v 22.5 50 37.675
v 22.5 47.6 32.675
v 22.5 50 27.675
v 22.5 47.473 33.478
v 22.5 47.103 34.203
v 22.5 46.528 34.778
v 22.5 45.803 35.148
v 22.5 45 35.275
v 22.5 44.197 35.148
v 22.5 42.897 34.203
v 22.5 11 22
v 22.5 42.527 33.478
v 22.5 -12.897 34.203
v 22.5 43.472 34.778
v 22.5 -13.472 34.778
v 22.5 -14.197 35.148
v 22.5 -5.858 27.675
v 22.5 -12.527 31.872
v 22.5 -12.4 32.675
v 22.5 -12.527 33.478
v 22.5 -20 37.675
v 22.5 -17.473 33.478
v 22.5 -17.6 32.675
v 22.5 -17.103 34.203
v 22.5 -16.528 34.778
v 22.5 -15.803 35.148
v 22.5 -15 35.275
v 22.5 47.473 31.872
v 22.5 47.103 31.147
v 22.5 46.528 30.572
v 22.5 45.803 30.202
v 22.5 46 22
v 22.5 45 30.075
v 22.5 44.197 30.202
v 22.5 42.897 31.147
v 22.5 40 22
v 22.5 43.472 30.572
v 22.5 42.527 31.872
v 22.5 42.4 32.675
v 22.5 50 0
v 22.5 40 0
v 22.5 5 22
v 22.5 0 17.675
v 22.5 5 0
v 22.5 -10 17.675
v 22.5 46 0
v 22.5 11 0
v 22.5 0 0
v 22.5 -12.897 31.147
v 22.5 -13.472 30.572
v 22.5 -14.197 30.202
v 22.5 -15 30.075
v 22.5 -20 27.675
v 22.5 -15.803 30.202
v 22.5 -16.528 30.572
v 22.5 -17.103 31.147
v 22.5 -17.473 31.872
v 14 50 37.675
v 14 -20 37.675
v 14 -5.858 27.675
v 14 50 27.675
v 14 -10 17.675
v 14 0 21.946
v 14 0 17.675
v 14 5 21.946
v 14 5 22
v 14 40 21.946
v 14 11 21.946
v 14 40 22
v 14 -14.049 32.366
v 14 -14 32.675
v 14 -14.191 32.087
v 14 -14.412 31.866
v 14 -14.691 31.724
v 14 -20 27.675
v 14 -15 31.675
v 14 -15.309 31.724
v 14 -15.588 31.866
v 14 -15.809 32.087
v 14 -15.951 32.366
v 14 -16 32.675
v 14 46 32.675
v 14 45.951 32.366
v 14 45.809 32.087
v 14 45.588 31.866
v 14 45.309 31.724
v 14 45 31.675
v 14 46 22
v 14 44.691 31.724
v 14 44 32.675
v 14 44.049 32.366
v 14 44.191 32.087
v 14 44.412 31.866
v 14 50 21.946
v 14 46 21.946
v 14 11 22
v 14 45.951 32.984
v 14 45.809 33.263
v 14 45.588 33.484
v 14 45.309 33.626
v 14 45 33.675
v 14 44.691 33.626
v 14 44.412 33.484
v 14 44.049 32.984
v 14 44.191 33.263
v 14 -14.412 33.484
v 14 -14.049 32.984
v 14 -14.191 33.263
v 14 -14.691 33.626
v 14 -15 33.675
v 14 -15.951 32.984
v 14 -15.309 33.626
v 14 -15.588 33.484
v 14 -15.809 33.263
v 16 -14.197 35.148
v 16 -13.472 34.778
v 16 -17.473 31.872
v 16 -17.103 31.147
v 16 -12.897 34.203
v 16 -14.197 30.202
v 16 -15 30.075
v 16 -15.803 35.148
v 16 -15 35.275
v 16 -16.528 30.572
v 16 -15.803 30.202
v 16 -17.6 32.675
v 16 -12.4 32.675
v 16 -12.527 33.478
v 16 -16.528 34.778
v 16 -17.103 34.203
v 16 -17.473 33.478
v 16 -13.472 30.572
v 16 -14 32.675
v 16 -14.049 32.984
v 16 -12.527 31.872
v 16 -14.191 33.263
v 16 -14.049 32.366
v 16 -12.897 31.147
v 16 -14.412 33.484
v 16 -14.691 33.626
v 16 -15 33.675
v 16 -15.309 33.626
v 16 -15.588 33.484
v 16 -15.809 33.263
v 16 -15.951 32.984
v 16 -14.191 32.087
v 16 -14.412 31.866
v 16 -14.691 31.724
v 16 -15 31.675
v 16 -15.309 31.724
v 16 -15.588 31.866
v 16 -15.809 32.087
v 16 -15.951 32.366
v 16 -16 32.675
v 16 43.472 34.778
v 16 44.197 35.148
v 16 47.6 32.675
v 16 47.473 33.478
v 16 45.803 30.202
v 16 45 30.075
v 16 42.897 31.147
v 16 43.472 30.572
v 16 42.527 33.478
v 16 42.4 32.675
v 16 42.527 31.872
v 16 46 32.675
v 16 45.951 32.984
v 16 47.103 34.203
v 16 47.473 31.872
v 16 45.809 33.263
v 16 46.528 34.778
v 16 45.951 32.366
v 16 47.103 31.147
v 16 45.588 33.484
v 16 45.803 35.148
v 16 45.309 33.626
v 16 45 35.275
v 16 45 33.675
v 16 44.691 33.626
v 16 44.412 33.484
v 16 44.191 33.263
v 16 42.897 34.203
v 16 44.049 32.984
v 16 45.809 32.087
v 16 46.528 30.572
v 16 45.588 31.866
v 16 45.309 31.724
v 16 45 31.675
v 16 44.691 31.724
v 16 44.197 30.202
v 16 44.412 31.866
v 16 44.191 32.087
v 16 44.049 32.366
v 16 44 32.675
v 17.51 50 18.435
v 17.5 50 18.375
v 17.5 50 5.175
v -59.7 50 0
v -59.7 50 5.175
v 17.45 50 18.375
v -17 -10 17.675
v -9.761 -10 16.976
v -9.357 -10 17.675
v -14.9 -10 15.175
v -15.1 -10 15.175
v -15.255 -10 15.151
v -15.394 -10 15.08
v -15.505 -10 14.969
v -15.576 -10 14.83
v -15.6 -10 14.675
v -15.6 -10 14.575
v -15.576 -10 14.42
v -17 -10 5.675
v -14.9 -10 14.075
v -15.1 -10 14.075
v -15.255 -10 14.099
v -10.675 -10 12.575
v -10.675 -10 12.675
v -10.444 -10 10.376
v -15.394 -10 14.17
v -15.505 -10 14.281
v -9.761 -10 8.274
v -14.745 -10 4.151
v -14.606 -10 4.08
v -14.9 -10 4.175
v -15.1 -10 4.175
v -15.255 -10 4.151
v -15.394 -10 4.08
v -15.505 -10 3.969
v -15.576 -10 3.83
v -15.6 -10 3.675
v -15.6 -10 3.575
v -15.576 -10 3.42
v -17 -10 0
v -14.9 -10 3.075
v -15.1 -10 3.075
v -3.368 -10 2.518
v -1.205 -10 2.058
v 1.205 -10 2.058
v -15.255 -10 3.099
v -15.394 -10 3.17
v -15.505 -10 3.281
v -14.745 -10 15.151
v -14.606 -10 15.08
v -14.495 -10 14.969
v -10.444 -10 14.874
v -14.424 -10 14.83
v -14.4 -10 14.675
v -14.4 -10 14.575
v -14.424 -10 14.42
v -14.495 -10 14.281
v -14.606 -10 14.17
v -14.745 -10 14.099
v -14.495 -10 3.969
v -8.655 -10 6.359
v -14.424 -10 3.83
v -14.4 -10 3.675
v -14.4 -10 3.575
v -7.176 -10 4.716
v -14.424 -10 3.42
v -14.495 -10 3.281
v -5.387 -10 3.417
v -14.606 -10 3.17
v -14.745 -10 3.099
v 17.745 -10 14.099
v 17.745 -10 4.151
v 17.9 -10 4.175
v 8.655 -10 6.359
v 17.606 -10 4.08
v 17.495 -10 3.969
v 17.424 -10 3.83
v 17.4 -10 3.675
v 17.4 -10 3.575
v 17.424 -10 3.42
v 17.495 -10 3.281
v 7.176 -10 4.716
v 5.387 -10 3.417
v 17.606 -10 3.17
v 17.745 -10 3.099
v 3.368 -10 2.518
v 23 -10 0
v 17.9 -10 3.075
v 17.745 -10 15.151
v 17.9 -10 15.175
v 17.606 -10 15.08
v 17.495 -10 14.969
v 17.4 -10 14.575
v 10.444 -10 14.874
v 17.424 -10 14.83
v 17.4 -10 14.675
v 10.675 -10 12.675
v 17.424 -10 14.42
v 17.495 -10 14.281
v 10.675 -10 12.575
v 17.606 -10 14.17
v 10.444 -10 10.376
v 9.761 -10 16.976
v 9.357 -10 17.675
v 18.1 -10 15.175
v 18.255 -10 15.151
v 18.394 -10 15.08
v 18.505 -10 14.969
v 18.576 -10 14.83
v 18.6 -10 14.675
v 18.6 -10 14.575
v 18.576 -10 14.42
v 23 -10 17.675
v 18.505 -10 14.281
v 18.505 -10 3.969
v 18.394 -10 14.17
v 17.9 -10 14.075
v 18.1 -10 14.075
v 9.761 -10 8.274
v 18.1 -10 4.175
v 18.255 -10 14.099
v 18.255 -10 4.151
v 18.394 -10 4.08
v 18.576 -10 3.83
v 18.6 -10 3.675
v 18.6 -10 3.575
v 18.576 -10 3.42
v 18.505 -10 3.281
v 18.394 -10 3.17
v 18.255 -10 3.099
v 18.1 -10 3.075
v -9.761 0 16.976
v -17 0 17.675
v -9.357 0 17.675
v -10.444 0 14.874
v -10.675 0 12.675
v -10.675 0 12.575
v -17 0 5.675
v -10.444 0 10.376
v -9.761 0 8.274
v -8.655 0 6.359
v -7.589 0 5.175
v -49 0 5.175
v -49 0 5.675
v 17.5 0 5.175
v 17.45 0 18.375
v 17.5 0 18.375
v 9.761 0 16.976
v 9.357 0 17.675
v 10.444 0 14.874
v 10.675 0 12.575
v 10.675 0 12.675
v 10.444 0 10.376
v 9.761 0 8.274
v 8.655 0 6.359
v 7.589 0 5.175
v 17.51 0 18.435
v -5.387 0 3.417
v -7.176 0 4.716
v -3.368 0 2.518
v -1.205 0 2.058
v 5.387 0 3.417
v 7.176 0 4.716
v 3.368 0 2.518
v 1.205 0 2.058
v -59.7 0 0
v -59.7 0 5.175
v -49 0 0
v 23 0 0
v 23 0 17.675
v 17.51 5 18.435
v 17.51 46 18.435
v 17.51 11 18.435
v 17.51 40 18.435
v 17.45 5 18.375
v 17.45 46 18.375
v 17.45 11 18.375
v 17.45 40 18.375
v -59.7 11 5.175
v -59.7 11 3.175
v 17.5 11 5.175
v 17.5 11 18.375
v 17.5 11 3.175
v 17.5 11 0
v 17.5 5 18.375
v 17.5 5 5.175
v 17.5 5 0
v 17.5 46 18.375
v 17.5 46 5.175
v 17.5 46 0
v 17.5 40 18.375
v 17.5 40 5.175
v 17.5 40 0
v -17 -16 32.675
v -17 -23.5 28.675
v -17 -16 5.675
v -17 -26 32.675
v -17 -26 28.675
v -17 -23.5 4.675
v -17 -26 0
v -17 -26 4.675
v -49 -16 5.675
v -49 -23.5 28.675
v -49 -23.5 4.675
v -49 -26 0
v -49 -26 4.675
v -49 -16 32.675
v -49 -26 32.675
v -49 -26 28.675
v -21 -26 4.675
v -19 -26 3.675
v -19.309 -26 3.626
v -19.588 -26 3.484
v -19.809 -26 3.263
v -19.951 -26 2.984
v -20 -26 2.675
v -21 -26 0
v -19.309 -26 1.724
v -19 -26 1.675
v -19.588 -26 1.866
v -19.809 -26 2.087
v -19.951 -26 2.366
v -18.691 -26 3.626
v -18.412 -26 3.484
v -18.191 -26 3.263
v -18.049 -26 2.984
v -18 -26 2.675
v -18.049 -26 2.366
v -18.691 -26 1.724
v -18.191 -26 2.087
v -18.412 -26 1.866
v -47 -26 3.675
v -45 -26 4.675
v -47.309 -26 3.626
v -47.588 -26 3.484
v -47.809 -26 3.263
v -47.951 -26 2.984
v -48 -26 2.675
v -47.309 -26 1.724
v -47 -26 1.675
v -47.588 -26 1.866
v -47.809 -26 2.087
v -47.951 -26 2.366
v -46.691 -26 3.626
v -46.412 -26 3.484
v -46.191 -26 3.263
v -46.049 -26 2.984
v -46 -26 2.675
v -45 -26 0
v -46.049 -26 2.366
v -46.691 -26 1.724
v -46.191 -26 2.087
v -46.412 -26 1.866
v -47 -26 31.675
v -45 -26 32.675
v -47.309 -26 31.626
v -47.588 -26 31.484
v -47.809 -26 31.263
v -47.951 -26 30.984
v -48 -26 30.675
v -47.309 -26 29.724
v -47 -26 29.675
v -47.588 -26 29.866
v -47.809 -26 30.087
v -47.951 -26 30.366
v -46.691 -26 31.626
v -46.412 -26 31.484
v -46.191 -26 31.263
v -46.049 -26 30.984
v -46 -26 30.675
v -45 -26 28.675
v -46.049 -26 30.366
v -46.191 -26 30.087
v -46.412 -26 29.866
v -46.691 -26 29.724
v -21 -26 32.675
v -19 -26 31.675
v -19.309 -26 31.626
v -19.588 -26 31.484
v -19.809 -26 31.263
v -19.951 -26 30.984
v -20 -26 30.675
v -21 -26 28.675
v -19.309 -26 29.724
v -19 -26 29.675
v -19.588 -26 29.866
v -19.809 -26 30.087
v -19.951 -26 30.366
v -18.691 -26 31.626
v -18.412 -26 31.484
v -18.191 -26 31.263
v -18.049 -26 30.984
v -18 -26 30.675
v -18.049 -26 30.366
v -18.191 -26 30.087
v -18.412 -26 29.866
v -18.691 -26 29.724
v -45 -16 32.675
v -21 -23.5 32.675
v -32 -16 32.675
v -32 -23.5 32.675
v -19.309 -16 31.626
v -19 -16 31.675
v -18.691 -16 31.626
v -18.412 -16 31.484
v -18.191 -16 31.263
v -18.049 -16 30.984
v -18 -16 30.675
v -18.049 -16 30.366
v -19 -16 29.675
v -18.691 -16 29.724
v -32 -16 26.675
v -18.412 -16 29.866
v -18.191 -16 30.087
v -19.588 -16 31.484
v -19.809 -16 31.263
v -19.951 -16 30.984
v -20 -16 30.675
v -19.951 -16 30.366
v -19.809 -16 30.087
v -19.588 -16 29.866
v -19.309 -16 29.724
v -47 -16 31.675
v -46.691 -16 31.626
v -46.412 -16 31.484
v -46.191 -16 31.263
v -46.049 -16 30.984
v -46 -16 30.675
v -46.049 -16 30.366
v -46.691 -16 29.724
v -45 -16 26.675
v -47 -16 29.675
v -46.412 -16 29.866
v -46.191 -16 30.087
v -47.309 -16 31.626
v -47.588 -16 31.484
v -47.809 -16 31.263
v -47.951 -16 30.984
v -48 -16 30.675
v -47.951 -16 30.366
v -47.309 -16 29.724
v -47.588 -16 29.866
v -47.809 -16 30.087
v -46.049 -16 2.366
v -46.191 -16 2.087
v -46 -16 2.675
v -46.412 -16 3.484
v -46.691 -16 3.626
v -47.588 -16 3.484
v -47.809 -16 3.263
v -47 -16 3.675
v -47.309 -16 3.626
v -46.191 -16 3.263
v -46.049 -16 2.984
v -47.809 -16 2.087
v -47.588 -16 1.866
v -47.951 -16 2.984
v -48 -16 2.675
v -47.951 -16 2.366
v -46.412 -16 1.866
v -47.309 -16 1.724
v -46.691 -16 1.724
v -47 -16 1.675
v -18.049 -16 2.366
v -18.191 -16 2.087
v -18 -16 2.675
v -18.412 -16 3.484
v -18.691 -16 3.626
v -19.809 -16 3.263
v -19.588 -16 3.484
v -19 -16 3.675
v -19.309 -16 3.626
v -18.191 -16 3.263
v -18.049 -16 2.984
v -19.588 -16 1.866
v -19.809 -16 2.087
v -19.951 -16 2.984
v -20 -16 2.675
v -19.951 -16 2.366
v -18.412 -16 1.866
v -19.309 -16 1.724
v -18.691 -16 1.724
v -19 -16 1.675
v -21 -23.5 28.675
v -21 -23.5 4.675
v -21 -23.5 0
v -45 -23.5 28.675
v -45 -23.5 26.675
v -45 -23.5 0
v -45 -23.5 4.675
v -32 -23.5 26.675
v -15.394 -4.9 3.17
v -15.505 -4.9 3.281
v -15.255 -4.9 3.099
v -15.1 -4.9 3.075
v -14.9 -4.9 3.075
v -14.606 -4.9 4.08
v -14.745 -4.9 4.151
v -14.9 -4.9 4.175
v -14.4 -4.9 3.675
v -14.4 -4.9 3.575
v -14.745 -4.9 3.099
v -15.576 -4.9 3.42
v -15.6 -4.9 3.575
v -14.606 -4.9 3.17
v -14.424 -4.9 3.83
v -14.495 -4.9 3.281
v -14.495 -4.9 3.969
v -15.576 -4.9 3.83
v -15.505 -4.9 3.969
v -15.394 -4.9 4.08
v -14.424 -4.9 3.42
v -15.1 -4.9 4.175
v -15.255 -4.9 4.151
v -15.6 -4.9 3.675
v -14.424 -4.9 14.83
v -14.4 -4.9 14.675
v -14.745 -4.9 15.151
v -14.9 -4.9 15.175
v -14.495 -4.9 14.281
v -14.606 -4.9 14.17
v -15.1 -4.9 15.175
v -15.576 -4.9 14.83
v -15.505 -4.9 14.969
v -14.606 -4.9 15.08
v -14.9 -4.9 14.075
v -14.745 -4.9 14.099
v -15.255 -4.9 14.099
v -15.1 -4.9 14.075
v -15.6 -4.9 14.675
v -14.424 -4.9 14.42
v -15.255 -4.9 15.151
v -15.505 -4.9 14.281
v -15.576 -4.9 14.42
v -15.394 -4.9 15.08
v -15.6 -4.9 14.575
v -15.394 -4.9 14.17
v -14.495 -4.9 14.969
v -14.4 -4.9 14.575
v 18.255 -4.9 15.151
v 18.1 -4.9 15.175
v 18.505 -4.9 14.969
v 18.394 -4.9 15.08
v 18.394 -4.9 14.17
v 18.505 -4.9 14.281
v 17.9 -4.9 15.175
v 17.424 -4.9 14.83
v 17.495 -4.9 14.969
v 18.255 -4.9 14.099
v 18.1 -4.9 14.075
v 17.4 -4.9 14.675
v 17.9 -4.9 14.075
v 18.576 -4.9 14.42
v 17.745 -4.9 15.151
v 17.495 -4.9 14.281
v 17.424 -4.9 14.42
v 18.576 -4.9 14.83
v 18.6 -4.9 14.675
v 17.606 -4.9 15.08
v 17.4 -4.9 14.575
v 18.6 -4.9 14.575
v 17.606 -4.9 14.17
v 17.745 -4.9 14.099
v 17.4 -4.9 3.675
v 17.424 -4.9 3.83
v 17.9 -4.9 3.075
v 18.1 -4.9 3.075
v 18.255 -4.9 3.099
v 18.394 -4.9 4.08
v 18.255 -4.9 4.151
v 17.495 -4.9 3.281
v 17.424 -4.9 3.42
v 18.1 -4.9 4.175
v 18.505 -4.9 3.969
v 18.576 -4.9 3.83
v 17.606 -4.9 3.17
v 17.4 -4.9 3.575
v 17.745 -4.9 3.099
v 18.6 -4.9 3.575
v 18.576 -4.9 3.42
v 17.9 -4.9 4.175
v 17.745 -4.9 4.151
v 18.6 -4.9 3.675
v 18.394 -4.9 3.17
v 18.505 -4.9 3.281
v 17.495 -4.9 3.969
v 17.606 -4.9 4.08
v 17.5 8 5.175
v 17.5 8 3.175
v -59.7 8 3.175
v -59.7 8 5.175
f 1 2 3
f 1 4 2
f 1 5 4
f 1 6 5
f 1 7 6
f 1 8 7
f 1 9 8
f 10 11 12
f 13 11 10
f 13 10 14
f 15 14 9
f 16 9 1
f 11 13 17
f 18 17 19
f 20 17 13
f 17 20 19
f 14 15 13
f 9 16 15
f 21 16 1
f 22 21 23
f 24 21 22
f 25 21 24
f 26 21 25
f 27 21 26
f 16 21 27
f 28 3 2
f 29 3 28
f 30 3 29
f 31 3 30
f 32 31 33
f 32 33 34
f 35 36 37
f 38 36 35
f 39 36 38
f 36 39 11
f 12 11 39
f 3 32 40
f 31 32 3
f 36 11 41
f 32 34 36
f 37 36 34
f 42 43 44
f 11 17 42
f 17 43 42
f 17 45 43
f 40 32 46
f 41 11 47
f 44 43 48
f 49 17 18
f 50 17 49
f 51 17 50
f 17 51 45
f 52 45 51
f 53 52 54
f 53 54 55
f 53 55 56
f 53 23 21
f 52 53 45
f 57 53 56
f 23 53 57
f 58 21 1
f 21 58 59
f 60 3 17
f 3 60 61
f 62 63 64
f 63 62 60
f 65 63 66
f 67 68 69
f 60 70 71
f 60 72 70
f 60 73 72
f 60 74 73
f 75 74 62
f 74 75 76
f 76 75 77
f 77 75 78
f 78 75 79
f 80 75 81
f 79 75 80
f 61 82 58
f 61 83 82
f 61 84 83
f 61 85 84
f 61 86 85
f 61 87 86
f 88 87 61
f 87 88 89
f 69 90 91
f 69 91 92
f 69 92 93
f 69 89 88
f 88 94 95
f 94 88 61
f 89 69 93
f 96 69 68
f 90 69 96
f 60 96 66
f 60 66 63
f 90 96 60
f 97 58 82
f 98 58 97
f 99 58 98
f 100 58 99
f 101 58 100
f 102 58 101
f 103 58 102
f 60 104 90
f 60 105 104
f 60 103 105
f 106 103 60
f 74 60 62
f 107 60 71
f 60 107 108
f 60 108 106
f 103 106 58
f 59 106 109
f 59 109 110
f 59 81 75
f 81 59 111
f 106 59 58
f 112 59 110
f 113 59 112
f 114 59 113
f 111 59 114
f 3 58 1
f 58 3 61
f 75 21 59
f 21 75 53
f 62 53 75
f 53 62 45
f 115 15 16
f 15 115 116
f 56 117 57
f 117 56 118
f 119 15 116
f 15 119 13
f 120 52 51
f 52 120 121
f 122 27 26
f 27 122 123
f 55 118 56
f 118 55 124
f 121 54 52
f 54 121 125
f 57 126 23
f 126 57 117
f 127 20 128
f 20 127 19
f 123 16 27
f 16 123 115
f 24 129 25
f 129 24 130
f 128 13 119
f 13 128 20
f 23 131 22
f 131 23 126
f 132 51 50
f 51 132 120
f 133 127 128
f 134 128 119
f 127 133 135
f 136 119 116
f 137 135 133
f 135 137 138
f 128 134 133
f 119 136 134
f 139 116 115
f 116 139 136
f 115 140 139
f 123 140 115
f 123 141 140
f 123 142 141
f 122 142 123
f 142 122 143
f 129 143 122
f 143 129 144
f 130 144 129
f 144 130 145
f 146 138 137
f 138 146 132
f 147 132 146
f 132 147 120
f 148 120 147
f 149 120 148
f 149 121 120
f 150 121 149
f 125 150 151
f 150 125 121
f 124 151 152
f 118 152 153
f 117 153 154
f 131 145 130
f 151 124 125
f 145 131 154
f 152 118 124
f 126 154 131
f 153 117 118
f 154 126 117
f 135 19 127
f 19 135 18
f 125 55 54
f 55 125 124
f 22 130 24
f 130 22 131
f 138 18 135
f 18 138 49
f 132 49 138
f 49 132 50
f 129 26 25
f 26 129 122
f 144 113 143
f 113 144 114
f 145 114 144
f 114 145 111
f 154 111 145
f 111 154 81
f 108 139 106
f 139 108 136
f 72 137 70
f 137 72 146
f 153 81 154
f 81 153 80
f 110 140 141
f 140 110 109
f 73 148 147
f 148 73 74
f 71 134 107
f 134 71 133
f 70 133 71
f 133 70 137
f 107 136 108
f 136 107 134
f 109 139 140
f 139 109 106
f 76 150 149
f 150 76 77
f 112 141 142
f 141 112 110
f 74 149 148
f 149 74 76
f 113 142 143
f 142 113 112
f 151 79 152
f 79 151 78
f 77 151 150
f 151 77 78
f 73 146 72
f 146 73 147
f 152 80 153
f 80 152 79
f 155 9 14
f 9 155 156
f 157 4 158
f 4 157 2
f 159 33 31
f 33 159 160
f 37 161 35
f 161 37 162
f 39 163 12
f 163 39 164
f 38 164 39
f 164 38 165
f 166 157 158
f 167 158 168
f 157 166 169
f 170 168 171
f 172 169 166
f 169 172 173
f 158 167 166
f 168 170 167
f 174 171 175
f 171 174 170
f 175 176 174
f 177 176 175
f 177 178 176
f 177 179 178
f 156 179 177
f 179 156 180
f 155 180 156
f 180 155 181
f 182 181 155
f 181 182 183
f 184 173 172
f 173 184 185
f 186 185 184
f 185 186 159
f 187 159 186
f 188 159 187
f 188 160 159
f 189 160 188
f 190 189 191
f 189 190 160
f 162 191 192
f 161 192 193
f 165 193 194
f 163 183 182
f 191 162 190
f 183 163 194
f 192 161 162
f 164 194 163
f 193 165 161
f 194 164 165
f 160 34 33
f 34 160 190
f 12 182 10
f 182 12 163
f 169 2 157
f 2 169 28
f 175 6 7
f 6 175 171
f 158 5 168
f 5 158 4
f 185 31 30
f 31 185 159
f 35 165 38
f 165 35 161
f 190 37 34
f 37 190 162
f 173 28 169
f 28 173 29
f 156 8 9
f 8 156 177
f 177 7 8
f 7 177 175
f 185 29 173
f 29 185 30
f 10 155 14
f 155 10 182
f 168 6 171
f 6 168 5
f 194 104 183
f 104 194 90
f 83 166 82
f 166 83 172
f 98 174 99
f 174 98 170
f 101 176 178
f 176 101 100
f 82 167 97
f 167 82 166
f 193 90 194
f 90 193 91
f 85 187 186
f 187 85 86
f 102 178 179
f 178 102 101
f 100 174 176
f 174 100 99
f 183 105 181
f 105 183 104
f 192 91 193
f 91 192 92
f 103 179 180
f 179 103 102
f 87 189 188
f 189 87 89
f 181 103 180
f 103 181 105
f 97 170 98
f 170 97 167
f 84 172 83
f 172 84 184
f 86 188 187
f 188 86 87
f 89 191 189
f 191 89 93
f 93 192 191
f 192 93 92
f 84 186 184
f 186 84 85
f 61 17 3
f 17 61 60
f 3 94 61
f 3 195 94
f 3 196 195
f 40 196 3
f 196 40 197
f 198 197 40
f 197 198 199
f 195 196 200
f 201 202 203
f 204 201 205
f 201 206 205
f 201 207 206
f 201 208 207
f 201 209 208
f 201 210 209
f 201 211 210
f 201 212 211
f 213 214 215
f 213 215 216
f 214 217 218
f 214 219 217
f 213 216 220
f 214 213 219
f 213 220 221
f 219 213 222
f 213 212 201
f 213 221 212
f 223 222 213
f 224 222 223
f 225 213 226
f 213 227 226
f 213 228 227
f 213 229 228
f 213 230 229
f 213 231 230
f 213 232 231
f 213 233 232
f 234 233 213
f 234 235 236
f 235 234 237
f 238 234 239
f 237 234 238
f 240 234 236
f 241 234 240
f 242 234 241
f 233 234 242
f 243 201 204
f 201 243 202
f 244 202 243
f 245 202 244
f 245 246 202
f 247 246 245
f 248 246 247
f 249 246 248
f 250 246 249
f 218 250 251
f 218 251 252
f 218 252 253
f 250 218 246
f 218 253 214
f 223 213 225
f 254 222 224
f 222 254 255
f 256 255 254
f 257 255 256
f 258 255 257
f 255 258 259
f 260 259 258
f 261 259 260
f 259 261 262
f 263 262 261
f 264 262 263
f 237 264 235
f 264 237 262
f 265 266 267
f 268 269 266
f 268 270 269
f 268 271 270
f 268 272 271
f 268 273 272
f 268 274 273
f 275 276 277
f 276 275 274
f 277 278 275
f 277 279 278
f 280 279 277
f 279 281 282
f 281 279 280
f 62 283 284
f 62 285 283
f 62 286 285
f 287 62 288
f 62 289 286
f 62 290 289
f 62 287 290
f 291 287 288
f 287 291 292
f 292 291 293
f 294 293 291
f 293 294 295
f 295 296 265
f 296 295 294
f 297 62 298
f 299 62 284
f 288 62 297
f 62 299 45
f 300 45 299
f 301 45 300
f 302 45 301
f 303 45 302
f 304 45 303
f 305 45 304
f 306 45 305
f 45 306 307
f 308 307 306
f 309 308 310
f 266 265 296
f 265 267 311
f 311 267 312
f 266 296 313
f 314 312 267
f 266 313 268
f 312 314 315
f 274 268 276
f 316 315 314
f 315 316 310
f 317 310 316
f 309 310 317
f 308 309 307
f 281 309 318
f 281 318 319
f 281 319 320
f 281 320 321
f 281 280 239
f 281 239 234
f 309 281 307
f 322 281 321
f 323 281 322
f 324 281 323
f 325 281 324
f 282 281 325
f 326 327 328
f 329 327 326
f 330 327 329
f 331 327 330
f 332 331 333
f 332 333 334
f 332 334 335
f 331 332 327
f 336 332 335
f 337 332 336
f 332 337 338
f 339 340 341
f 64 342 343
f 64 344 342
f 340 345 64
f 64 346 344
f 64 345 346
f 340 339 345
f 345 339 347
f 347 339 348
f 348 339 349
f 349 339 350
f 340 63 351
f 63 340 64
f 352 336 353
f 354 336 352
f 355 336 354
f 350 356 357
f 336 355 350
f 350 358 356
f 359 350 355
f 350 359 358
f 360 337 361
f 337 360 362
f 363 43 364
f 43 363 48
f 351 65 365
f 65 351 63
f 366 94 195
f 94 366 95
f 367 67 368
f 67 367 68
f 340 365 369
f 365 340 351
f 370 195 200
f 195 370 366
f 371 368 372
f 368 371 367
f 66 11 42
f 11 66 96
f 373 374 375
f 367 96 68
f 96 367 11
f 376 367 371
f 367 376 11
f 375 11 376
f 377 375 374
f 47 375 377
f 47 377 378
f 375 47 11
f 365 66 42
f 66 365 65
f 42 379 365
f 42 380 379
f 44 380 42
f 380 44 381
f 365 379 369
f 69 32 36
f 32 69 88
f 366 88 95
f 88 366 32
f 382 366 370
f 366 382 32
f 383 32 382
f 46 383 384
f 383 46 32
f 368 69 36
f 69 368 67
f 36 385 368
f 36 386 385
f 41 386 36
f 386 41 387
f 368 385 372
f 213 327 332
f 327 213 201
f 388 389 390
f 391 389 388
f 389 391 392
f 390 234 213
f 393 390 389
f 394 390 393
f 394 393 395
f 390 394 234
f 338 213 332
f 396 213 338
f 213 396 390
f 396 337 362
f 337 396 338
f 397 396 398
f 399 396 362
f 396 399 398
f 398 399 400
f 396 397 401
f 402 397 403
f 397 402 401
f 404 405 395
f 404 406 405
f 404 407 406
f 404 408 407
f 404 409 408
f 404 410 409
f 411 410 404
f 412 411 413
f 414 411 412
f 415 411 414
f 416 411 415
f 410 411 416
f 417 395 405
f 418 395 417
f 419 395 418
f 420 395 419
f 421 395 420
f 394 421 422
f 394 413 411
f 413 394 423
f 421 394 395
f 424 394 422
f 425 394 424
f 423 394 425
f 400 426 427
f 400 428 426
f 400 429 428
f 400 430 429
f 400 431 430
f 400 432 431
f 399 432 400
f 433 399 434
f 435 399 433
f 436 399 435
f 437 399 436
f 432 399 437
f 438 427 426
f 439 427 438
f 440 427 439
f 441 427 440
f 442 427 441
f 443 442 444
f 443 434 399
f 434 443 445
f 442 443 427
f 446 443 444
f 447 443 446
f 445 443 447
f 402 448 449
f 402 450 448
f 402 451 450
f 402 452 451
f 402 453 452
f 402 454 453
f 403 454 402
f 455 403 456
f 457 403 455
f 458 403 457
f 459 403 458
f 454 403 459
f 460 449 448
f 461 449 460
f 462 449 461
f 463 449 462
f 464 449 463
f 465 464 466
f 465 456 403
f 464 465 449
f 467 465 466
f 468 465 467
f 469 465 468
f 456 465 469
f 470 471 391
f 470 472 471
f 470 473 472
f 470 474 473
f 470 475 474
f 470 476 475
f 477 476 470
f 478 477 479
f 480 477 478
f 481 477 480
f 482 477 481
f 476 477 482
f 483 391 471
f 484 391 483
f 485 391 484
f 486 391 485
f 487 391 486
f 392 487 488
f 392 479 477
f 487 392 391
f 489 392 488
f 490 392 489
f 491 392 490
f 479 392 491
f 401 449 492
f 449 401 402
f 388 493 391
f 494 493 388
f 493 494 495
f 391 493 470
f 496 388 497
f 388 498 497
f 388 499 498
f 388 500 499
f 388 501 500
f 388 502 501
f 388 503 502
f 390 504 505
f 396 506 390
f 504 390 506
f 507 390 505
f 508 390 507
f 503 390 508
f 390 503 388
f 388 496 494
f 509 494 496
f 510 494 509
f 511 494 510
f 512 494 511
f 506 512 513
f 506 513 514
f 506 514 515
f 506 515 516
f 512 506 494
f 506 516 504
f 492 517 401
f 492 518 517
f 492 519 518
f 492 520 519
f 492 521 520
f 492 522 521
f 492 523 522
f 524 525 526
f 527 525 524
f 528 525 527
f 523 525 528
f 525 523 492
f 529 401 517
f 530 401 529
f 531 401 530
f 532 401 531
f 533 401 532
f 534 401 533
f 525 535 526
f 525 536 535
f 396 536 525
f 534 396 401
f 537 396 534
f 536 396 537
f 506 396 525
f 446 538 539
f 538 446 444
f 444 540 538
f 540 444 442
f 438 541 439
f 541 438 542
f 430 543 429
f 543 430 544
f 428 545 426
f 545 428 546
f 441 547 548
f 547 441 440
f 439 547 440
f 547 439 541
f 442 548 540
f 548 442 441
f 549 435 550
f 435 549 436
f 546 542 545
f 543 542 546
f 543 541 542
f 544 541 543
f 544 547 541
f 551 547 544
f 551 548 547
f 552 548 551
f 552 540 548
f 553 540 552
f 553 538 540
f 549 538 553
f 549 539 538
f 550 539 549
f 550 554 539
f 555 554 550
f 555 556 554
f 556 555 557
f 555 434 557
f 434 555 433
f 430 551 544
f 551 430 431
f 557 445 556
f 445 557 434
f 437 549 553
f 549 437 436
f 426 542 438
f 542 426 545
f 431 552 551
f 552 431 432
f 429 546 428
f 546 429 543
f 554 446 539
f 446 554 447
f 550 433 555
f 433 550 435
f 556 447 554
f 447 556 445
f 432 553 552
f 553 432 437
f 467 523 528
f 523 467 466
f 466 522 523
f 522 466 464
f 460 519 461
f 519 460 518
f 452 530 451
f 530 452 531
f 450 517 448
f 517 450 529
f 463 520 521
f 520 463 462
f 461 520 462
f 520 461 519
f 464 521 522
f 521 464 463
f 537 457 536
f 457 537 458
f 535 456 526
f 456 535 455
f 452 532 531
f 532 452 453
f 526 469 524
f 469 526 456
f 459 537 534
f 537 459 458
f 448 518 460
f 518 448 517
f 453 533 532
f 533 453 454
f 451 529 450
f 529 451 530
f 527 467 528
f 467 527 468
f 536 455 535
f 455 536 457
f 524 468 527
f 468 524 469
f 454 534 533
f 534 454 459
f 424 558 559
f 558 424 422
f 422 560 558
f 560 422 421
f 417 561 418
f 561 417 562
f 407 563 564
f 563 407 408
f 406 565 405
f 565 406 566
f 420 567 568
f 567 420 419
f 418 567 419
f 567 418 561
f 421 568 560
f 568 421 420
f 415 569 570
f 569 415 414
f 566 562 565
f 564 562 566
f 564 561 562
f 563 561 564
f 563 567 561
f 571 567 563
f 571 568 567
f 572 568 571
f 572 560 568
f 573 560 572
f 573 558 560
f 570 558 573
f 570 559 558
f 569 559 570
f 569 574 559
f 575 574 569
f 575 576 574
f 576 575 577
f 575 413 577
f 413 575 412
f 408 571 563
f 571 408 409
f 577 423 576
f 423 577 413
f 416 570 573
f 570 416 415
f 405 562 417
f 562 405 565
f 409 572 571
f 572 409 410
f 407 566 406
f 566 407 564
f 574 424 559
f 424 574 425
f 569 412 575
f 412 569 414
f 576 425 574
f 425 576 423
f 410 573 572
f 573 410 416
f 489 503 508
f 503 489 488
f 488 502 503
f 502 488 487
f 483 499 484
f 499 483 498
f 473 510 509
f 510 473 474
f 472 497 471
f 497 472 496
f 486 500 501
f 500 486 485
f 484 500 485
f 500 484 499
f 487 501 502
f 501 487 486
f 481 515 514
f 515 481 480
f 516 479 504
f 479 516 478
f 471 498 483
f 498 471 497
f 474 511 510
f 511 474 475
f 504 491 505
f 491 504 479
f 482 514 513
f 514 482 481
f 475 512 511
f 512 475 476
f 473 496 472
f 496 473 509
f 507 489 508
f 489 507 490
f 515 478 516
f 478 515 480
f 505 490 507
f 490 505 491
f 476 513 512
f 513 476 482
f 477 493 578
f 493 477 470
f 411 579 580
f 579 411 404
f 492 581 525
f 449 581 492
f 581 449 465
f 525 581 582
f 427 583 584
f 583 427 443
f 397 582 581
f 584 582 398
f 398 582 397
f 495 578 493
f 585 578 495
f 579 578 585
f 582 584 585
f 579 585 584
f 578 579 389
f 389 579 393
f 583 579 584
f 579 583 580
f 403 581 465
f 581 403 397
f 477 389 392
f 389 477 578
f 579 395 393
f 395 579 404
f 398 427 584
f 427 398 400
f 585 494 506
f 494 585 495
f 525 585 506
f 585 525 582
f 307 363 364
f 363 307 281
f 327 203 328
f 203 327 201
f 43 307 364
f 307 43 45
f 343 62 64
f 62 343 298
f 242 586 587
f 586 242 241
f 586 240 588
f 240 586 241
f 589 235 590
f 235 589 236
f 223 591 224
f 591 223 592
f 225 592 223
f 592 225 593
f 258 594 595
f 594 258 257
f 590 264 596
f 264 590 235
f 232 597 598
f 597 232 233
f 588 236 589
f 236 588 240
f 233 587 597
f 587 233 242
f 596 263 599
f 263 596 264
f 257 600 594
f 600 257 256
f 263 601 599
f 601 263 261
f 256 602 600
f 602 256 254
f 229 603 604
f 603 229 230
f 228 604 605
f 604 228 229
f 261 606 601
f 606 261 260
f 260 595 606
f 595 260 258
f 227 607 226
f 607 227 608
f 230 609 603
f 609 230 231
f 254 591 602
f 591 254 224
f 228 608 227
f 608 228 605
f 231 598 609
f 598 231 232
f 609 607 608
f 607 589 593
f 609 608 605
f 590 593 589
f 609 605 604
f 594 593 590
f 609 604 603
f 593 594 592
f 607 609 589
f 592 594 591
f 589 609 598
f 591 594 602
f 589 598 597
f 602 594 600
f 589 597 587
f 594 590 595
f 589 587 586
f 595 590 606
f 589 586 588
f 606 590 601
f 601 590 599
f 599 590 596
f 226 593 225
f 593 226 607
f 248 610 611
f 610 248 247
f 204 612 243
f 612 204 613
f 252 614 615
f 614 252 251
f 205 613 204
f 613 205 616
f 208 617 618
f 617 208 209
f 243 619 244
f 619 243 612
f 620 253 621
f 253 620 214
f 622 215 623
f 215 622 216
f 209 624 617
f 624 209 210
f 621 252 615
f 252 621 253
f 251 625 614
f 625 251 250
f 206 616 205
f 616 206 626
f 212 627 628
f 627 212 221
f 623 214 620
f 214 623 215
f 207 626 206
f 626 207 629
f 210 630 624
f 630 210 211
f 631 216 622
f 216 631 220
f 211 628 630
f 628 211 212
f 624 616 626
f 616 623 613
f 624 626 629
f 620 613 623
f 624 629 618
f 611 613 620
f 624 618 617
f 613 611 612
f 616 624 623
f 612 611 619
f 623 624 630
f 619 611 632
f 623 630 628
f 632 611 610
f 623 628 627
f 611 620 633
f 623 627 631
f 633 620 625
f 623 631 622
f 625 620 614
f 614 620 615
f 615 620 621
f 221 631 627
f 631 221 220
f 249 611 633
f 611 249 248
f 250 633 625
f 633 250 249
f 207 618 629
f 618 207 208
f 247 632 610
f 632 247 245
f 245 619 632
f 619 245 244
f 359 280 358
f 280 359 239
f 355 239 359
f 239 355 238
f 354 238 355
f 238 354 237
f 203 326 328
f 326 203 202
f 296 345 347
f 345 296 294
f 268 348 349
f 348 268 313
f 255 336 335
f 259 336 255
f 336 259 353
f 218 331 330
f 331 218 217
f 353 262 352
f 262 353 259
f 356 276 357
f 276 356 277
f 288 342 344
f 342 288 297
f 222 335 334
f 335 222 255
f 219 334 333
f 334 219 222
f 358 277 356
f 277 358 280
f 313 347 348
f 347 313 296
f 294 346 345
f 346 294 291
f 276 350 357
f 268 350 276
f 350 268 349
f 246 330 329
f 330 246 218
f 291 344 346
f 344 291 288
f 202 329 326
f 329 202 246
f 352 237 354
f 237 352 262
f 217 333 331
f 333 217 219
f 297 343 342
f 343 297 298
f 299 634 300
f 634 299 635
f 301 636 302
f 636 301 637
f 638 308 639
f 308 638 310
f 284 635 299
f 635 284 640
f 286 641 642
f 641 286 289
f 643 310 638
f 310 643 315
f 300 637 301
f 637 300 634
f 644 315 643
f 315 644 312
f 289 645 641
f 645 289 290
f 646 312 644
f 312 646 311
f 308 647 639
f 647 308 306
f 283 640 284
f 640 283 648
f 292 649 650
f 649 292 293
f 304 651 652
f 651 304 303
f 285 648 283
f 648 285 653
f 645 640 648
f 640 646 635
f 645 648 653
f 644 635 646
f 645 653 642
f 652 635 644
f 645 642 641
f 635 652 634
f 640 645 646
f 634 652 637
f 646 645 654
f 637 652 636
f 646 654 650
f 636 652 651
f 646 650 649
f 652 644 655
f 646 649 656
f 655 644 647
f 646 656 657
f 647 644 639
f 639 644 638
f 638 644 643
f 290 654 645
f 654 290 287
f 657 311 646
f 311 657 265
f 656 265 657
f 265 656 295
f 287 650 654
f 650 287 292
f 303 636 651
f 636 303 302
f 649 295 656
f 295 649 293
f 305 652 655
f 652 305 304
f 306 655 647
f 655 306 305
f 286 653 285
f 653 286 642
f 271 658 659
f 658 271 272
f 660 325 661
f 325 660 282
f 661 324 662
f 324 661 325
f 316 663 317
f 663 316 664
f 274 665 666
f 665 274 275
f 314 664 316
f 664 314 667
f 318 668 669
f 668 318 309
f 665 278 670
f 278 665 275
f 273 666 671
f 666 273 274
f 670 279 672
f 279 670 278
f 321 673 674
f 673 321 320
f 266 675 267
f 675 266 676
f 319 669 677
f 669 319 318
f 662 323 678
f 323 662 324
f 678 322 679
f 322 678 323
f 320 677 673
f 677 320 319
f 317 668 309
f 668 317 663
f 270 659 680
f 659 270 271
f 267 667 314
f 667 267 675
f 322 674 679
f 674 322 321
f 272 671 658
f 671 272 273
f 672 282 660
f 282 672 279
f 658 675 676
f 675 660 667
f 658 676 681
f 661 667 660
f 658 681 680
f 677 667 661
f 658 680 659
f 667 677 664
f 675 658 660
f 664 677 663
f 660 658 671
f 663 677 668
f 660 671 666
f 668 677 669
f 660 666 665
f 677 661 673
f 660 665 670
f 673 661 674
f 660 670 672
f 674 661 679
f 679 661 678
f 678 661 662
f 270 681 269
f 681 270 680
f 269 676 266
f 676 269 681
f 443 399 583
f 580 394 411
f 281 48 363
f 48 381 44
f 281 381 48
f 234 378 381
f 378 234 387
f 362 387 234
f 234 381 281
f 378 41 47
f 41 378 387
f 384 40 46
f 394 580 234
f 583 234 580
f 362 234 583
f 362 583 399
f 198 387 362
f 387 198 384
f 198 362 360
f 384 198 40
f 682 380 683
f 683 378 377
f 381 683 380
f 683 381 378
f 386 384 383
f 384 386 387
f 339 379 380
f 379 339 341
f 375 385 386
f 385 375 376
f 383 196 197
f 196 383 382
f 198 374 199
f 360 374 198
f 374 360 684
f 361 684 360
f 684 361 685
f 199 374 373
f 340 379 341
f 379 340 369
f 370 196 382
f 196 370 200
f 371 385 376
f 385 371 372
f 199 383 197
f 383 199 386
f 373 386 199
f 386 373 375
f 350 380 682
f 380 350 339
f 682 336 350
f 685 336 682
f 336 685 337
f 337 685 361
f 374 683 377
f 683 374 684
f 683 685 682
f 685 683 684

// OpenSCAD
opteka_r1 = 24.75/2;
opteka_r2 = 41.35/2;

module rounded(size, r) {
    union() {
        translate([r, 0, 0]) cube([size[0]-2*r, size[1], size[2]]);
        translate([0, r, 0]) cube([size[0], size[1]-2*r, size[2]]);
        translate([r, r, 0]) cylinder(h=size[2], r=r);
        translate([size[0]-r, r, 0]) cylinder(h=size[2], r=r);
        translate([r, size[1]-r, 0]) cylinder(h=size[2], r=r);
        translate([size[0]-r, size[1]-r, 0]) cylinder(h=size[2], r=r);
    }
}

sony_size = [77.2, 150, 13.2];
sony_lip = 9.5;
sony_offset = [-sony_size[0] + 17.5, 0, -7.5];

gakken_lens_plate = [40, 17];
gakken_lens_center = [17, 12];
gakken_lens_r = 21.15/2;
gakken_lens_h = 10;

camera_w = 32;
camera_spacing = 28;
camera_keepout = 24;
camera_r = 1.0;
camera_d = 16;
camera_cable_keepout = [6, 13];

boss1_offset = [16, -15, 20];
boss2 = 60;
boss_depth = 6.5;

module gakken() {
    cylinder(r=gakken_lens_r, h=gakken_lens_h);
    translate([18, 2, gakken_lens_h/2]) cylinder(r=0.5, h=gakken_lens_h/2, $fn=20);
    translate([18, -9, gakken_lens_h/2]) cylinder(r=0.5, h=gakken_lens_h/2, $fn=20);
    translate([-15, 2, gakken_lens_h/2]) cylinder(r=0.5, h=gakken_lens_h/2, $fn=20);
    translate([-15, -9, gakken_lens_h/2]) cylinder(r=0.5, h=gakken_lens_h/2, $fn=20);
}

module sony() {
    translate(sony_offset) {
        union() {
            cube(sony_size);
            translate([0, sony_lip-1.5, -2]) cube([sony_size[0], 3, 2]);
        }
    }
}

margin = 0.1;
wall = 5;
wall2 = 2;
image_h = 10;

globe_r1 = 98/2;
globe_r2 = 105/2;
globe_h = 15;
globe_bolt = 3.8/2;

module lens_mount() difference() {
    translate([0, 0, -8]) union() {
        translate([0, 0, opteka_r2]) difference() {
            union() {
                // Mounting points for the screw bosses in the globe
                translate([boss1_offset[0], boss1_offset[1], boss1_offset[2]]) difference() {
                    translate([-wall2, -wall, -wall]) union() {
                        cube([wall2+boss_depth, boss2+wall*2, wall*2]);
                        rotate([-45, 0, 0])cube([wall2+boss_depth, 15, wall*2]);
                    }
                    rotate([0, 90, 0]) cylinder(r=5.2/2, h=20, $fn=20);
                    translate([wall, 0, 0]) rotate([0, -90, 0]) cylinder(r=1, h=20, $fn=20);
                    translate([0, boss2, 0]) rotate([0, 90, 0]) cylinder(r=5.2/2, h=20, $fn=20);
                    translate([wall, boss2, 0]) rotate([0, -90, 0]) cylinder(r=1, h=20, $fn=20);
                }
                
                // Support for the bar with the mounting points
                translate([boss1_offset[0]-wall2, -gakken_lens_h, -opteka_r2]) {
                    difference() {
                        cube([wall2+boss_depth, boss2, boss1_offset[2]-wall+opteka_r2]);
                        translate([-2.5, gakken_lens_h, opteka_r2-0.25]) rotate([0, -45, 0])  cube([wall2+boss_depth, boss2, boss1_offset[2]-wall+opteka_r2]);
                        translate([0, 15, 0]) cube([wall2+boss_depth, 6, boss1_offset[2]+10]);
                        translate([0, 50, 0])cube([wall2+boss_depth, 6, boss1_offset[2]+10]);
                    }
                }
                
                // Mounting plate for the lens
                translate([-gakken_lens_center[0], -gakken_lens_h, -gakken_lens_center[1]-wall]) {
                    cube([gakken_lens_plate[0], gakken_lens_h, gakken_lens_plate[1]+wall]);
                }
                
                // Mounting for a ELP-USBFHD01M camera
                translate([-gakken_lens_center[0]-camera_w, -gakken_lens_h-camera_d, -gakken_lens_center[1]-wall]) {
                    difference() {
                        union() {
                            cube([camera_w, gakken_lens_h+camera_d, wall*2]);
                            cube([camera_w, wall*2, wall+camera_w]);
                        }
                        translate([(camera_w-camera_keepout)/2,0,0]) cube([camera_keepout, wall/2, wall+camera_w]);
                        translate([0,0,(camera_w-camera_keepout)/2+wall]) cube([camera_w, wall/2, camera_keepout]);
                        translate([(camera_w-camera_keepout)/2,0,camera_w-camera_cable_keepout[0]+wall]) cube([camera_cable_keepout[1], wall*3, camera_cable_keepout[0]]);
                        for (i = [0, camera_spacing]) {
                            for (j = [0, camera_spacing]) {
                                translate([(camera_w-camera_spacing)/2+i,0,wall+camera_r*2+j]) rotate([-90,0,0]) cylinder(r=1.0, h=wall*2, $fn=20);
                            }
                        }
                    }
                }
            }
            
            // Cut-out for the lens barrel and screw holes
            minkowski() {
                rotate([90, 0, 0]) gakken();
                translate([-margin, -margin, -margin]) cube([margin*2, margin*2, margin]);
            }
        }
    }
    
    translate([-200, -200, -100]) cube([400, 400, 100]);
}

difference() {
    union() {
        lens_mount();
        intersection() {
            sony();
            translate(sony_offset) cube([sony_size[0], boss2-gakken_lens_h, sony_size[2]]);
        }
    }
    translate([0, 0, opteka_r2-8]) sony();
    translate([-200, -200, -100]) cube([400, 400, 100]);
}
